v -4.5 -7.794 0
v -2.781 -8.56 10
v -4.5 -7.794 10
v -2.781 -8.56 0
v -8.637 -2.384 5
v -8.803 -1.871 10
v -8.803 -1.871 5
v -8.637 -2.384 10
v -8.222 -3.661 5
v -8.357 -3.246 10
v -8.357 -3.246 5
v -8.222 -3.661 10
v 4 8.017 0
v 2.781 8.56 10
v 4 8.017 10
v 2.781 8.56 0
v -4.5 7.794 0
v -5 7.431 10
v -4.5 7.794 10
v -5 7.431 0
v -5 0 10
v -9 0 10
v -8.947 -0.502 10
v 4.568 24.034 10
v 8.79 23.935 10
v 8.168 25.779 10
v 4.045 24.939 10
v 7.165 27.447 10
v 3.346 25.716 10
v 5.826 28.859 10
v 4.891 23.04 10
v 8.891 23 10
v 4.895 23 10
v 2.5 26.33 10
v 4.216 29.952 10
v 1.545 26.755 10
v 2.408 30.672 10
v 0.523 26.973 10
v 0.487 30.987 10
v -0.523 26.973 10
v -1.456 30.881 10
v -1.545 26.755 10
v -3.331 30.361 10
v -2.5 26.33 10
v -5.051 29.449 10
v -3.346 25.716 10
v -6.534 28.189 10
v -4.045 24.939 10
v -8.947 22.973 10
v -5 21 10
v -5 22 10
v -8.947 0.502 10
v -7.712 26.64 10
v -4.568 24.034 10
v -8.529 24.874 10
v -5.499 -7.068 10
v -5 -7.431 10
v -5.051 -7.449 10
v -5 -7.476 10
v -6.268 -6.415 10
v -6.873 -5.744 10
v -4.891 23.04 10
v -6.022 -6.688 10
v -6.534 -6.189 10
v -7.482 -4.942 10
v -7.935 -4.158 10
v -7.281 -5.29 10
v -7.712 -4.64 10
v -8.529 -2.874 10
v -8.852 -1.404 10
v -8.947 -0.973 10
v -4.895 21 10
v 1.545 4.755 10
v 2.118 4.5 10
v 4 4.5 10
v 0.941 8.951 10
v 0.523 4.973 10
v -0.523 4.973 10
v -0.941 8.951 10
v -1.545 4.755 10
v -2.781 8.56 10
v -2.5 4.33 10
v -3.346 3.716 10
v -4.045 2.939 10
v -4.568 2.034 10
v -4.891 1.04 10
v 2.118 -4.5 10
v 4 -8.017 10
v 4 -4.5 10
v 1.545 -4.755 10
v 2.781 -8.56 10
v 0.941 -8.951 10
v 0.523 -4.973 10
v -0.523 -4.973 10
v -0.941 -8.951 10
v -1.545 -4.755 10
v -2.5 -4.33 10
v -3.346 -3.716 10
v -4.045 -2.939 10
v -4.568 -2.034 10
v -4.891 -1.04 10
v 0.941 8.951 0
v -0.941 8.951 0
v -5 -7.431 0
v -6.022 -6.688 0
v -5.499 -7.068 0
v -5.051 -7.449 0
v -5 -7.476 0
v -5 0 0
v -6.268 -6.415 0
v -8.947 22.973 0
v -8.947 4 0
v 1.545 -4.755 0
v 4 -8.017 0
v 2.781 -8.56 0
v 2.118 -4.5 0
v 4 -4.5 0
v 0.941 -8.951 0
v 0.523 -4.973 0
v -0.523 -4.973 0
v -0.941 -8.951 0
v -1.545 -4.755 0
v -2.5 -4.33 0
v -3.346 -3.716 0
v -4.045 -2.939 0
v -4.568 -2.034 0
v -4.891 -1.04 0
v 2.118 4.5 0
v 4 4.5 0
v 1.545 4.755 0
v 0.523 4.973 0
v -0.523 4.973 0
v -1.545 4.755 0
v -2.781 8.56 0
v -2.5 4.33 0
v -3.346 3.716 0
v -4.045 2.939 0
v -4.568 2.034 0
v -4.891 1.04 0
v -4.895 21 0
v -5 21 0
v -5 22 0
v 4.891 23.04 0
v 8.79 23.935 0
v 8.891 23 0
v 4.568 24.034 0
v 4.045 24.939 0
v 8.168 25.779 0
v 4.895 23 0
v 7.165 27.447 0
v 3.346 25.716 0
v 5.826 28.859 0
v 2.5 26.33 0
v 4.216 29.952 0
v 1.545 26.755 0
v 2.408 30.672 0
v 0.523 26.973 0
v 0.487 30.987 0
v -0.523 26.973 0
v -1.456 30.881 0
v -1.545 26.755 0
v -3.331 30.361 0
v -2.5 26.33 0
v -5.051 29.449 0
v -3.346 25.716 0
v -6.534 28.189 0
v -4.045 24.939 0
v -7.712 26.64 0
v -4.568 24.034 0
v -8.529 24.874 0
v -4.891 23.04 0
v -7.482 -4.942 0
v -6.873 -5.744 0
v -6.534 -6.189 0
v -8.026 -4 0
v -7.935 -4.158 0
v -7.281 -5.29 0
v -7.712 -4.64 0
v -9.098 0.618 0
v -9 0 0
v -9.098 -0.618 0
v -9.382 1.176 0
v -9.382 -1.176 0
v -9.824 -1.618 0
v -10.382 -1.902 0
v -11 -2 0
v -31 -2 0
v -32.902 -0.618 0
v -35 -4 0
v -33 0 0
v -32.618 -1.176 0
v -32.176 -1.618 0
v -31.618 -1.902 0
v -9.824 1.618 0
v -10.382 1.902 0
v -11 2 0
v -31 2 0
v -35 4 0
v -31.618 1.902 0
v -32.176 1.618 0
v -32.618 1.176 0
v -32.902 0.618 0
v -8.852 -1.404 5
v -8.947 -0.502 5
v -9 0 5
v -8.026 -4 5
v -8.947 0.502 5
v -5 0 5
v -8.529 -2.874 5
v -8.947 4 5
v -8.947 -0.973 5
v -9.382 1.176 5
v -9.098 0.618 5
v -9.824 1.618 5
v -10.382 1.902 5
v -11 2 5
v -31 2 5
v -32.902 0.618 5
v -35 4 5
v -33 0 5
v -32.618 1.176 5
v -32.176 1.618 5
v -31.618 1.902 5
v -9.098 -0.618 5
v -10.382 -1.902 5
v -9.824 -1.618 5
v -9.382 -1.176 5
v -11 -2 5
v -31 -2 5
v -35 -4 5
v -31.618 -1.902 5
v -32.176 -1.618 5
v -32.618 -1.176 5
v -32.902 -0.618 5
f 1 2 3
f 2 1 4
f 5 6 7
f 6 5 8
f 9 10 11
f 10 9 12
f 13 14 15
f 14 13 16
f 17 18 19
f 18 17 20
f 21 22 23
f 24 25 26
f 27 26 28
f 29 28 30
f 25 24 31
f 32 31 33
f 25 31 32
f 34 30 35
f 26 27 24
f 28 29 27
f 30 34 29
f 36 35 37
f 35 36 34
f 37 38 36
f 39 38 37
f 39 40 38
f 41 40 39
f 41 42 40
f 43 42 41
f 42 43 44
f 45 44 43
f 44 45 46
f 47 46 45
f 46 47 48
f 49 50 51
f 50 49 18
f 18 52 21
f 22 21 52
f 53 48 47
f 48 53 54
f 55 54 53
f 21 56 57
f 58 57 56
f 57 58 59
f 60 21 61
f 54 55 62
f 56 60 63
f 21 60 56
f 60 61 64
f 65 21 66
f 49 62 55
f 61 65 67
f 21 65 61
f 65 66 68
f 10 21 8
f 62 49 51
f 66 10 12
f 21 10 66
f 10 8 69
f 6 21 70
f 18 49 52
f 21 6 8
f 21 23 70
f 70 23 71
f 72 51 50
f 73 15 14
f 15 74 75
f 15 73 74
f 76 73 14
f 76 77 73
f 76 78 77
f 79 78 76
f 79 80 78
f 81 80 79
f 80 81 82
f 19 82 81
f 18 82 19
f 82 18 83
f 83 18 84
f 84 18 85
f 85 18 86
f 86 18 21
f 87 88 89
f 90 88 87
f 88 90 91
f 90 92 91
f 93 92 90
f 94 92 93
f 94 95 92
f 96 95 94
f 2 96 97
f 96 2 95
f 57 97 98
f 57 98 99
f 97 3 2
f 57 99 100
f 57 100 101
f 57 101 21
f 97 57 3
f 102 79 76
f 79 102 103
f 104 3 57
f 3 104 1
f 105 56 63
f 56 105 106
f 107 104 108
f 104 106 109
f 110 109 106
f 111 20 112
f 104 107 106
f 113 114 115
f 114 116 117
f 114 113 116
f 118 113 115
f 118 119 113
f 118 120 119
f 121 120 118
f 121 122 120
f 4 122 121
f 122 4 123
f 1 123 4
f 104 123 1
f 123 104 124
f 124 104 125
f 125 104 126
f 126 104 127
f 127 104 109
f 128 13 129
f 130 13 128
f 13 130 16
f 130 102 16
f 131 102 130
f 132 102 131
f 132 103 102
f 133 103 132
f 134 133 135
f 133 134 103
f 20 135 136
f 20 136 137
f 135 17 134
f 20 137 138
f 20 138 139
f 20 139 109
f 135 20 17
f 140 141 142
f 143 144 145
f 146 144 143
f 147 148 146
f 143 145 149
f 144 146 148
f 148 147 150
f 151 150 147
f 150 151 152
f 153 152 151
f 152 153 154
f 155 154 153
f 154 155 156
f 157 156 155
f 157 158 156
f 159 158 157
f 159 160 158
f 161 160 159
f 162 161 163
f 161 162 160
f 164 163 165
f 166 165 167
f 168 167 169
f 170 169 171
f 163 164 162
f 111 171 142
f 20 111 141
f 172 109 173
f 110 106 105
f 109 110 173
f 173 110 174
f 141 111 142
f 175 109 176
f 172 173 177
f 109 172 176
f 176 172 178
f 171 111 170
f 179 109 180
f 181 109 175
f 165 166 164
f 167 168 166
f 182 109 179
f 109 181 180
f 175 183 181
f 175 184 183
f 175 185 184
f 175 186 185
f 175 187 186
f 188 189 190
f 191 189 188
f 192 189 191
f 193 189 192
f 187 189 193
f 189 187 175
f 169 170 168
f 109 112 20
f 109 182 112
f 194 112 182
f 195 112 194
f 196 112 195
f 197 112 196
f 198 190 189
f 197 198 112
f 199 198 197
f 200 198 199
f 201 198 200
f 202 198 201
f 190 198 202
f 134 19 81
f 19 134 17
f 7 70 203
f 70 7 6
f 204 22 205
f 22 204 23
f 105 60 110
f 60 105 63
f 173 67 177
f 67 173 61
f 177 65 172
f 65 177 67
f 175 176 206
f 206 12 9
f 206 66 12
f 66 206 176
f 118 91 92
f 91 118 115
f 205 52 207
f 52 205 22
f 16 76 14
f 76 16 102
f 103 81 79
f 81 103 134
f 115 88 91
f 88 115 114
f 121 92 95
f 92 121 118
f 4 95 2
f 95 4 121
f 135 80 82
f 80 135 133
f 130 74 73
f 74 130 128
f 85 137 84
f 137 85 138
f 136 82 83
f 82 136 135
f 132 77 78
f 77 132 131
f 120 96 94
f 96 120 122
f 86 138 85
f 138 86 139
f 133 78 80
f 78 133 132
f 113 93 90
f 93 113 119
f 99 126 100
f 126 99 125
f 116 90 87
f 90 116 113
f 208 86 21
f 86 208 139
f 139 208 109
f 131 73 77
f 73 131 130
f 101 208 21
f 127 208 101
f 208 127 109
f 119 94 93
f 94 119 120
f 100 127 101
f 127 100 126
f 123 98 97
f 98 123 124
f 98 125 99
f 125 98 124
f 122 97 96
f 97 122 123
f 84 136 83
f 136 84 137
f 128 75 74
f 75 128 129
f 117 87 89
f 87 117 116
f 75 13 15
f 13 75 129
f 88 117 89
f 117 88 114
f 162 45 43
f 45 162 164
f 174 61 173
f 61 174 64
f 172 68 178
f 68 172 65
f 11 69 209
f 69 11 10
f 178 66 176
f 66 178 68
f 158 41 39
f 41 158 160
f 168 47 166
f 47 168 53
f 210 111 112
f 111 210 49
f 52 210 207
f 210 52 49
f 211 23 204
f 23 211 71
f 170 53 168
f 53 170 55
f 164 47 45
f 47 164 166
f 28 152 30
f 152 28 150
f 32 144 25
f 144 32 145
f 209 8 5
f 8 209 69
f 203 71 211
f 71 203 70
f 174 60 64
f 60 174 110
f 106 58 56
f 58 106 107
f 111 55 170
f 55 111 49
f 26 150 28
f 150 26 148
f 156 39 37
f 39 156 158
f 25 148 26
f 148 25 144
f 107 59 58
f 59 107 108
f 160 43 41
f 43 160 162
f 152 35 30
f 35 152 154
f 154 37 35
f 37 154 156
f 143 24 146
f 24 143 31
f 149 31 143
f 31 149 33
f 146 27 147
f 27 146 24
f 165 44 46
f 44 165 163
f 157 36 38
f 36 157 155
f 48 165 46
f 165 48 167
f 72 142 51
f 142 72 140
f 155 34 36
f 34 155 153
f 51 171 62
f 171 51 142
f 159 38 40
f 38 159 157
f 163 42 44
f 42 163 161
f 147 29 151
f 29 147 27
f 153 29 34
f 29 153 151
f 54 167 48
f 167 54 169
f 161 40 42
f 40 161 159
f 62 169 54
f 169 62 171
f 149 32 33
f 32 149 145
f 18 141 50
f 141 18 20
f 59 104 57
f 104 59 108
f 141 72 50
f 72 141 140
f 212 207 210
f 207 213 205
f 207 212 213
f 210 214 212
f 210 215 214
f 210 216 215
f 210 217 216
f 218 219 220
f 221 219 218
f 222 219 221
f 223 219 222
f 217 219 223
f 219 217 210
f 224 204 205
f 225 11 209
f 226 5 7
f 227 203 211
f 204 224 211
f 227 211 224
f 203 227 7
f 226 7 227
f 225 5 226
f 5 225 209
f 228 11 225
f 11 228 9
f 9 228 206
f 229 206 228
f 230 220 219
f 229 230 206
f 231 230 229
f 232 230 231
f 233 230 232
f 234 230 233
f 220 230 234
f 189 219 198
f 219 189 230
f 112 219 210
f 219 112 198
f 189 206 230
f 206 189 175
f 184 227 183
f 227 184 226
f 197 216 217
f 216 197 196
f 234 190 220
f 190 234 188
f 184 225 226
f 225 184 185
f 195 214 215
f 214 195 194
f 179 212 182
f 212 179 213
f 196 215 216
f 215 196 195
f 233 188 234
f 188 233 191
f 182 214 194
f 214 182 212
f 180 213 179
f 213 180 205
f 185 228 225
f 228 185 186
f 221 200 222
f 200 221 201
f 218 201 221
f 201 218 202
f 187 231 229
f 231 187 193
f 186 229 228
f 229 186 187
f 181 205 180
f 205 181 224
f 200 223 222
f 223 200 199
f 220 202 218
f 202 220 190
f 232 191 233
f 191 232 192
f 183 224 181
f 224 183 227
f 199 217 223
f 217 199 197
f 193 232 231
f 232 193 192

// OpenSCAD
module bed_cable_clip() {

  thickness = 10;
  rod = 10;
  length = 30;

  *cylinder(r=11, h=thickness, $fn=30);
  difference() {
    cylinder(r=9, h=thickness, $fn=30);
    cylinder(r=rod/2, h=thickness+2, $fn=30);
    translate([0, -(rod - 1) / 2, 0]) cube([10, rod - 1, thickness]);
    translate([(rod / 2) - 1, -15, 0]) cube([10, 30, thickness]);
  }

  translate([2, -9, 0]) difference() {
    hull() {
      translate(v = [-2,10-1,0]) cylinder(h = 10, r=9);
      translate(v = [-2,30+1,0]) cylinder(h = 10, r=9);
    }
    translate(v = [-2,10-1,-1]) cylinder(r=rod/2, h=thickness+2, $fn=30);	
    translate(v = [-2,30+1,-1]) cylinder(r=rod/2, h=thickness+2, $fn=30);
    translate([0,-8,0]) cube([10,40,10]);
    translate([-7,-10,0]) cube([10,40,10]);
  }

  difference() {
    translate([-length-rod/2, -8/2, 0]) cube([length, 8, 5]);
    hull() for(i=[0:4]) translate([-length-rod/2+3+(i*5)+1,0,0]) cylinder(r=4/2, h=6, $fn=20);
  }
}

bed_cable_clip();
